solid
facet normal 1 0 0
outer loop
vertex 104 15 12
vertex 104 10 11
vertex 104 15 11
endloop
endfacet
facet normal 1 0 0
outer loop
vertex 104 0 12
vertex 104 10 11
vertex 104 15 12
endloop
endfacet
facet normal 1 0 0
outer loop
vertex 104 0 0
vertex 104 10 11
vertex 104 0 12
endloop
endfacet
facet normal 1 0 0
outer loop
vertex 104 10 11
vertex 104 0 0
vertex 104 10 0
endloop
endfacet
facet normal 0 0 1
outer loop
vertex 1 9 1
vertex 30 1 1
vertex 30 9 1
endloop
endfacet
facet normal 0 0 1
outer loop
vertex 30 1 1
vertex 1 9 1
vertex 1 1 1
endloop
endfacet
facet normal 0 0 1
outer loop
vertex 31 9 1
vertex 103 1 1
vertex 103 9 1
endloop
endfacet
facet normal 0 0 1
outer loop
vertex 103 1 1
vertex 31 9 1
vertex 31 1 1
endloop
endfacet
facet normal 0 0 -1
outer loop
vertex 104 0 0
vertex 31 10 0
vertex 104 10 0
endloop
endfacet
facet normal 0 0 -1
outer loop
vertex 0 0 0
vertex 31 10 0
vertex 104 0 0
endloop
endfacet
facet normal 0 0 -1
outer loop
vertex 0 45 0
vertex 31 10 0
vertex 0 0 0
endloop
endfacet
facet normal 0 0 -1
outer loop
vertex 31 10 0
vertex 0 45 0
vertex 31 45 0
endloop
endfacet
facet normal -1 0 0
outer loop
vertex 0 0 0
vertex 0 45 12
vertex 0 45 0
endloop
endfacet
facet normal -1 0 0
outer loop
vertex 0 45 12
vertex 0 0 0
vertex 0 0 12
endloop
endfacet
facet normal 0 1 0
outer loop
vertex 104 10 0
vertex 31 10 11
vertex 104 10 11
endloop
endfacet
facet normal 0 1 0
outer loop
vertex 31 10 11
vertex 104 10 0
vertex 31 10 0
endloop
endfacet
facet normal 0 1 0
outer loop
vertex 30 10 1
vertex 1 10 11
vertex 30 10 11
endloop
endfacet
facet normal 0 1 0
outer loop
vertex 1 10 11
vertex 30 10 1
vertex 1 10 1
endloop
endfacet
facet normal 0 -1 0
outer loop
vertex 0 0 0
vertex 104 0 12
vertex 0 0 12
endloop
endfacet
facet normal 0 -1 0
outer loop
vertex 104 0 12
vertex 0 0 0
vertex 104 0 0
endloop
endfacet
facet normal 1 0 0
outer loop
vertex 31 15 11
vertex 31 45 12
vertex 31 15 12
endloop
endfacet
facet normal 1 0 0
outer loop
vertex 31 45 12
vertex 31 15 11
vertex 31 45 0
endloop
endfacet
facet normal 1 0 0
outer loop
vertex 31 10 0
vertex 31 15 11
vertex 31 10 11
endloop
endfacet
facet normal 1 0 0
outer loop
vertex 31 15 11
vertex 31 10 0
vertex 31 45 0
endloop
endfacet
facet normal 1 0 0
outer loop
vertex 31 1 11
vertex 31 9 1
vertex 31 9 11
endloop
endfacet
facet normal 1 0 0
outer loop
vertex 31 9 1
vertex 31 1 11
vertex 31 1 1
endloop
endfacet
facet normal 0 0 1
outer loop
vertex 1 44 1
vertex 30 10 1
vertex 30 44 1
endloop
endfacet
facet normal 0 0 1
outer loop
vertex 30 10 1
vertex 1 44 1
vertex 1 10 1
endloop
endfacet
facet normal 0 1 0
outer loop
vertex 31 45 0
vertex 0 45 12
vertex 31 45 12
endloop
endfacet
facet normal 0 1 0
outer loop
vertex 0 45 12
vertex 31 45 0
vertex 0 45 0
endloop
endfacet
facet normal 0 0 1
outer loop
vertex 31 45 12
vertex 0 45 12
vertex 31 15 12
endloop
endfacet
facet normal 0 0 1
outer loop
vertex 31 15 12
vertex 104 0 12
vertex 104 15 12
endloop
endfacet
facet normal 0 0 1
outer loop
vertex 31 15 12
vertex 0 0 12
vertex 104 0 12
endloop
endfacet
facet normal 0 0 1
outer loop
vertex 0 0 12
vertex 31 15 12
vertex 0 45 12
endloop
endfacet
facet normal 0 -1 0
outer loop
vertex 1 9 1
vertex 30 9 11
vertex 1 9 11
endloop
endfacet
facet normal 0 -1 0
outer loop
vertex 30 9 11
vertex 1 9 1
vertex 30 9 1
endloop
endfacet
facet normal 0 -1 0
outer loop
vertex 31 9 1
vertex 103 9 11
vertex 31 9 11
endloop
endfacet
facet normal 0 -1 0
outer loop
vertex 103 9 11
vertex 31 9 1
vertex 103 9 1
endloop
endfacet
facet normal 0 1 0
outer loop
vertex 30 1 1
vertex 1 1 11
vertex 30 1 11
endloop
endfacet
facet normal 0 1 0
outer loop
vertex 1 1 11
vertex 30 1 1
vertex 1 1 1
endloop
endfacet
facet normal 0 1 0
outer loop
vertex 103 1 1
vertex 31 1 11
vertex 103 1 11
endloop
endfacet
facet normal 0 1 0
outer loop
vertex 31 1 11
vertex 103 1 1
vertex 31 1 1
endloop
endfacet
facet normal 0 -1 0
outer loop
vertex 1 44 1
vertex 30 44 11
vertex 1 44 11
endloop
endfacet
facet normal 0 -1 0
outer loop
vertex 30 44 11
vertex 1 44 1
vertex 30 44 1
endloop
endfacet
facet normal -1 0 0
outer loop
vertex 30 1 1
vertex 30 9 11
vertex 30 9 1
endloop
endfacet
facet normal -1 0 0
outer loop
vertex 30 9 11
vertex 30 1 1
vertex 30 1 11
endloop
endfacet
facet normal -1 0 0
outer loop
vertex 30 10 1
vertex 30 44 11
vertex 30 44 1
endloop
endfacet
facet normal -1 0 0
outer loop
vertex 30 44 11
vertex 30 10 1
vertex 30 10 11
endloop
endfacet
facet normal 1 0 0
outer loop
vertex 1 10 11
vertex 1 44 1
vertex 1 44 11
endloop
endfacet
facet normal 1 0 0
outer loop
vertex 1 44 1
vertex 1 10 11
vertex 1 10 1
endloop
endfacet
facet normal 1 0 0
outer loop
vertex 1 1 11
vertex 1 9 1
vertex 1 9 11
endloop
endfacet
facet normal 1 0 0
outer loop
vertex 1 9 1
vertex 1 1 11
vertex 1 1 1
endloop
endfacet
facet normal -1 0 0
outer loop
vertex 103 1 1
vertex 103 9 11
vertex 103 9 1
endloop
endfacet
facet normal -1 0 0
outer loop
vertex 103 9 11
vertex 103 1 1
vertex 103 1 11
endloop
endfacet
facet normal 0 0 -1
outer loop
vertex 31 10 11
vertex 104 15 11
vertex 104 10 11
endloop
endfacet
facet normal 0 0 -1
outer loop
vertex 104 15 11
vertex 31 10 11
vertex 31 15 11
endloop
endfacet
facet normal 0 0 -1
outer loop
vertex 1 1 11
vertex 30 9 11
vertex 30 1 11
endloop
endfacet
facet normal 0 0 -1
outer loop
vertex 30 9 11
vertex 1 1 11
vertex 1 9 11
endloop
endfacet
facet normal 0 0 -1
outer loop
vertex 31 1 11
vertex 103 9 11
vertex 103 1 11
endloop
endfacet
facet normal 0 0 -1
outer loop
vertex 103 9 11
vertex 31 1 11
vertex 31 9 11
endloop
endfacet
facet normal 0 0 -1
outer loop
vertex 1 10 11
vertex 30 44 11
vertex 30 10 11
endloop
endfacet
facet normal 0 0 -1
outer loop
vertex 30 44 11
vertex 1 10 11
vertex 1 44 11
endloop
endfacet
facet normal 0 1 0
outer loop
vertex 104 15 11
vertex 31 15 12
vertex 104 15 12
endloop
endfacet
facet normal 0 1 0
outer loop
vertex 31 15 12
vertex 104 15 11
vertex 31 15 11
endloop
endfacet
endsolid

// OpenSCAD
//module prism(l, w, h){
//   polyhedron( 
//    points=[[0,0,0], [l,0,0], [l,w,0], [0,w,0], [0,w,h], [l,w,h]],
//    faces=[[0,1,2,3],[5,4,3,2],[0,4,5,1],[0,3,4],[5,2,1]]
//   );
//}



//104

thick = 1;

// horizontal
//1
cube([104,10,thick]);
//2
translate([0,10,0])
    cube([31, 35, thick]);


//vertical
//1.1
translate([0,10-thick,0])
    cube([104, thick, 12]);
//1.2
cube([104, thick, 12]);
//1.3
translate([0,45-thick,0])
    cube([31, thick, 12]);

//2.1
translate([31-thick,0,0])
    cube([thick,45,12]);
//2.2
cube([thick,45,12]);
//2.3
translate([104-thick,0,0])
    cube([thick,10,12]);


//top


translate([0,0,11])
    cube([104,15,thick]);
 translate([0,10,11])
    cube([31, 35, thick]);
